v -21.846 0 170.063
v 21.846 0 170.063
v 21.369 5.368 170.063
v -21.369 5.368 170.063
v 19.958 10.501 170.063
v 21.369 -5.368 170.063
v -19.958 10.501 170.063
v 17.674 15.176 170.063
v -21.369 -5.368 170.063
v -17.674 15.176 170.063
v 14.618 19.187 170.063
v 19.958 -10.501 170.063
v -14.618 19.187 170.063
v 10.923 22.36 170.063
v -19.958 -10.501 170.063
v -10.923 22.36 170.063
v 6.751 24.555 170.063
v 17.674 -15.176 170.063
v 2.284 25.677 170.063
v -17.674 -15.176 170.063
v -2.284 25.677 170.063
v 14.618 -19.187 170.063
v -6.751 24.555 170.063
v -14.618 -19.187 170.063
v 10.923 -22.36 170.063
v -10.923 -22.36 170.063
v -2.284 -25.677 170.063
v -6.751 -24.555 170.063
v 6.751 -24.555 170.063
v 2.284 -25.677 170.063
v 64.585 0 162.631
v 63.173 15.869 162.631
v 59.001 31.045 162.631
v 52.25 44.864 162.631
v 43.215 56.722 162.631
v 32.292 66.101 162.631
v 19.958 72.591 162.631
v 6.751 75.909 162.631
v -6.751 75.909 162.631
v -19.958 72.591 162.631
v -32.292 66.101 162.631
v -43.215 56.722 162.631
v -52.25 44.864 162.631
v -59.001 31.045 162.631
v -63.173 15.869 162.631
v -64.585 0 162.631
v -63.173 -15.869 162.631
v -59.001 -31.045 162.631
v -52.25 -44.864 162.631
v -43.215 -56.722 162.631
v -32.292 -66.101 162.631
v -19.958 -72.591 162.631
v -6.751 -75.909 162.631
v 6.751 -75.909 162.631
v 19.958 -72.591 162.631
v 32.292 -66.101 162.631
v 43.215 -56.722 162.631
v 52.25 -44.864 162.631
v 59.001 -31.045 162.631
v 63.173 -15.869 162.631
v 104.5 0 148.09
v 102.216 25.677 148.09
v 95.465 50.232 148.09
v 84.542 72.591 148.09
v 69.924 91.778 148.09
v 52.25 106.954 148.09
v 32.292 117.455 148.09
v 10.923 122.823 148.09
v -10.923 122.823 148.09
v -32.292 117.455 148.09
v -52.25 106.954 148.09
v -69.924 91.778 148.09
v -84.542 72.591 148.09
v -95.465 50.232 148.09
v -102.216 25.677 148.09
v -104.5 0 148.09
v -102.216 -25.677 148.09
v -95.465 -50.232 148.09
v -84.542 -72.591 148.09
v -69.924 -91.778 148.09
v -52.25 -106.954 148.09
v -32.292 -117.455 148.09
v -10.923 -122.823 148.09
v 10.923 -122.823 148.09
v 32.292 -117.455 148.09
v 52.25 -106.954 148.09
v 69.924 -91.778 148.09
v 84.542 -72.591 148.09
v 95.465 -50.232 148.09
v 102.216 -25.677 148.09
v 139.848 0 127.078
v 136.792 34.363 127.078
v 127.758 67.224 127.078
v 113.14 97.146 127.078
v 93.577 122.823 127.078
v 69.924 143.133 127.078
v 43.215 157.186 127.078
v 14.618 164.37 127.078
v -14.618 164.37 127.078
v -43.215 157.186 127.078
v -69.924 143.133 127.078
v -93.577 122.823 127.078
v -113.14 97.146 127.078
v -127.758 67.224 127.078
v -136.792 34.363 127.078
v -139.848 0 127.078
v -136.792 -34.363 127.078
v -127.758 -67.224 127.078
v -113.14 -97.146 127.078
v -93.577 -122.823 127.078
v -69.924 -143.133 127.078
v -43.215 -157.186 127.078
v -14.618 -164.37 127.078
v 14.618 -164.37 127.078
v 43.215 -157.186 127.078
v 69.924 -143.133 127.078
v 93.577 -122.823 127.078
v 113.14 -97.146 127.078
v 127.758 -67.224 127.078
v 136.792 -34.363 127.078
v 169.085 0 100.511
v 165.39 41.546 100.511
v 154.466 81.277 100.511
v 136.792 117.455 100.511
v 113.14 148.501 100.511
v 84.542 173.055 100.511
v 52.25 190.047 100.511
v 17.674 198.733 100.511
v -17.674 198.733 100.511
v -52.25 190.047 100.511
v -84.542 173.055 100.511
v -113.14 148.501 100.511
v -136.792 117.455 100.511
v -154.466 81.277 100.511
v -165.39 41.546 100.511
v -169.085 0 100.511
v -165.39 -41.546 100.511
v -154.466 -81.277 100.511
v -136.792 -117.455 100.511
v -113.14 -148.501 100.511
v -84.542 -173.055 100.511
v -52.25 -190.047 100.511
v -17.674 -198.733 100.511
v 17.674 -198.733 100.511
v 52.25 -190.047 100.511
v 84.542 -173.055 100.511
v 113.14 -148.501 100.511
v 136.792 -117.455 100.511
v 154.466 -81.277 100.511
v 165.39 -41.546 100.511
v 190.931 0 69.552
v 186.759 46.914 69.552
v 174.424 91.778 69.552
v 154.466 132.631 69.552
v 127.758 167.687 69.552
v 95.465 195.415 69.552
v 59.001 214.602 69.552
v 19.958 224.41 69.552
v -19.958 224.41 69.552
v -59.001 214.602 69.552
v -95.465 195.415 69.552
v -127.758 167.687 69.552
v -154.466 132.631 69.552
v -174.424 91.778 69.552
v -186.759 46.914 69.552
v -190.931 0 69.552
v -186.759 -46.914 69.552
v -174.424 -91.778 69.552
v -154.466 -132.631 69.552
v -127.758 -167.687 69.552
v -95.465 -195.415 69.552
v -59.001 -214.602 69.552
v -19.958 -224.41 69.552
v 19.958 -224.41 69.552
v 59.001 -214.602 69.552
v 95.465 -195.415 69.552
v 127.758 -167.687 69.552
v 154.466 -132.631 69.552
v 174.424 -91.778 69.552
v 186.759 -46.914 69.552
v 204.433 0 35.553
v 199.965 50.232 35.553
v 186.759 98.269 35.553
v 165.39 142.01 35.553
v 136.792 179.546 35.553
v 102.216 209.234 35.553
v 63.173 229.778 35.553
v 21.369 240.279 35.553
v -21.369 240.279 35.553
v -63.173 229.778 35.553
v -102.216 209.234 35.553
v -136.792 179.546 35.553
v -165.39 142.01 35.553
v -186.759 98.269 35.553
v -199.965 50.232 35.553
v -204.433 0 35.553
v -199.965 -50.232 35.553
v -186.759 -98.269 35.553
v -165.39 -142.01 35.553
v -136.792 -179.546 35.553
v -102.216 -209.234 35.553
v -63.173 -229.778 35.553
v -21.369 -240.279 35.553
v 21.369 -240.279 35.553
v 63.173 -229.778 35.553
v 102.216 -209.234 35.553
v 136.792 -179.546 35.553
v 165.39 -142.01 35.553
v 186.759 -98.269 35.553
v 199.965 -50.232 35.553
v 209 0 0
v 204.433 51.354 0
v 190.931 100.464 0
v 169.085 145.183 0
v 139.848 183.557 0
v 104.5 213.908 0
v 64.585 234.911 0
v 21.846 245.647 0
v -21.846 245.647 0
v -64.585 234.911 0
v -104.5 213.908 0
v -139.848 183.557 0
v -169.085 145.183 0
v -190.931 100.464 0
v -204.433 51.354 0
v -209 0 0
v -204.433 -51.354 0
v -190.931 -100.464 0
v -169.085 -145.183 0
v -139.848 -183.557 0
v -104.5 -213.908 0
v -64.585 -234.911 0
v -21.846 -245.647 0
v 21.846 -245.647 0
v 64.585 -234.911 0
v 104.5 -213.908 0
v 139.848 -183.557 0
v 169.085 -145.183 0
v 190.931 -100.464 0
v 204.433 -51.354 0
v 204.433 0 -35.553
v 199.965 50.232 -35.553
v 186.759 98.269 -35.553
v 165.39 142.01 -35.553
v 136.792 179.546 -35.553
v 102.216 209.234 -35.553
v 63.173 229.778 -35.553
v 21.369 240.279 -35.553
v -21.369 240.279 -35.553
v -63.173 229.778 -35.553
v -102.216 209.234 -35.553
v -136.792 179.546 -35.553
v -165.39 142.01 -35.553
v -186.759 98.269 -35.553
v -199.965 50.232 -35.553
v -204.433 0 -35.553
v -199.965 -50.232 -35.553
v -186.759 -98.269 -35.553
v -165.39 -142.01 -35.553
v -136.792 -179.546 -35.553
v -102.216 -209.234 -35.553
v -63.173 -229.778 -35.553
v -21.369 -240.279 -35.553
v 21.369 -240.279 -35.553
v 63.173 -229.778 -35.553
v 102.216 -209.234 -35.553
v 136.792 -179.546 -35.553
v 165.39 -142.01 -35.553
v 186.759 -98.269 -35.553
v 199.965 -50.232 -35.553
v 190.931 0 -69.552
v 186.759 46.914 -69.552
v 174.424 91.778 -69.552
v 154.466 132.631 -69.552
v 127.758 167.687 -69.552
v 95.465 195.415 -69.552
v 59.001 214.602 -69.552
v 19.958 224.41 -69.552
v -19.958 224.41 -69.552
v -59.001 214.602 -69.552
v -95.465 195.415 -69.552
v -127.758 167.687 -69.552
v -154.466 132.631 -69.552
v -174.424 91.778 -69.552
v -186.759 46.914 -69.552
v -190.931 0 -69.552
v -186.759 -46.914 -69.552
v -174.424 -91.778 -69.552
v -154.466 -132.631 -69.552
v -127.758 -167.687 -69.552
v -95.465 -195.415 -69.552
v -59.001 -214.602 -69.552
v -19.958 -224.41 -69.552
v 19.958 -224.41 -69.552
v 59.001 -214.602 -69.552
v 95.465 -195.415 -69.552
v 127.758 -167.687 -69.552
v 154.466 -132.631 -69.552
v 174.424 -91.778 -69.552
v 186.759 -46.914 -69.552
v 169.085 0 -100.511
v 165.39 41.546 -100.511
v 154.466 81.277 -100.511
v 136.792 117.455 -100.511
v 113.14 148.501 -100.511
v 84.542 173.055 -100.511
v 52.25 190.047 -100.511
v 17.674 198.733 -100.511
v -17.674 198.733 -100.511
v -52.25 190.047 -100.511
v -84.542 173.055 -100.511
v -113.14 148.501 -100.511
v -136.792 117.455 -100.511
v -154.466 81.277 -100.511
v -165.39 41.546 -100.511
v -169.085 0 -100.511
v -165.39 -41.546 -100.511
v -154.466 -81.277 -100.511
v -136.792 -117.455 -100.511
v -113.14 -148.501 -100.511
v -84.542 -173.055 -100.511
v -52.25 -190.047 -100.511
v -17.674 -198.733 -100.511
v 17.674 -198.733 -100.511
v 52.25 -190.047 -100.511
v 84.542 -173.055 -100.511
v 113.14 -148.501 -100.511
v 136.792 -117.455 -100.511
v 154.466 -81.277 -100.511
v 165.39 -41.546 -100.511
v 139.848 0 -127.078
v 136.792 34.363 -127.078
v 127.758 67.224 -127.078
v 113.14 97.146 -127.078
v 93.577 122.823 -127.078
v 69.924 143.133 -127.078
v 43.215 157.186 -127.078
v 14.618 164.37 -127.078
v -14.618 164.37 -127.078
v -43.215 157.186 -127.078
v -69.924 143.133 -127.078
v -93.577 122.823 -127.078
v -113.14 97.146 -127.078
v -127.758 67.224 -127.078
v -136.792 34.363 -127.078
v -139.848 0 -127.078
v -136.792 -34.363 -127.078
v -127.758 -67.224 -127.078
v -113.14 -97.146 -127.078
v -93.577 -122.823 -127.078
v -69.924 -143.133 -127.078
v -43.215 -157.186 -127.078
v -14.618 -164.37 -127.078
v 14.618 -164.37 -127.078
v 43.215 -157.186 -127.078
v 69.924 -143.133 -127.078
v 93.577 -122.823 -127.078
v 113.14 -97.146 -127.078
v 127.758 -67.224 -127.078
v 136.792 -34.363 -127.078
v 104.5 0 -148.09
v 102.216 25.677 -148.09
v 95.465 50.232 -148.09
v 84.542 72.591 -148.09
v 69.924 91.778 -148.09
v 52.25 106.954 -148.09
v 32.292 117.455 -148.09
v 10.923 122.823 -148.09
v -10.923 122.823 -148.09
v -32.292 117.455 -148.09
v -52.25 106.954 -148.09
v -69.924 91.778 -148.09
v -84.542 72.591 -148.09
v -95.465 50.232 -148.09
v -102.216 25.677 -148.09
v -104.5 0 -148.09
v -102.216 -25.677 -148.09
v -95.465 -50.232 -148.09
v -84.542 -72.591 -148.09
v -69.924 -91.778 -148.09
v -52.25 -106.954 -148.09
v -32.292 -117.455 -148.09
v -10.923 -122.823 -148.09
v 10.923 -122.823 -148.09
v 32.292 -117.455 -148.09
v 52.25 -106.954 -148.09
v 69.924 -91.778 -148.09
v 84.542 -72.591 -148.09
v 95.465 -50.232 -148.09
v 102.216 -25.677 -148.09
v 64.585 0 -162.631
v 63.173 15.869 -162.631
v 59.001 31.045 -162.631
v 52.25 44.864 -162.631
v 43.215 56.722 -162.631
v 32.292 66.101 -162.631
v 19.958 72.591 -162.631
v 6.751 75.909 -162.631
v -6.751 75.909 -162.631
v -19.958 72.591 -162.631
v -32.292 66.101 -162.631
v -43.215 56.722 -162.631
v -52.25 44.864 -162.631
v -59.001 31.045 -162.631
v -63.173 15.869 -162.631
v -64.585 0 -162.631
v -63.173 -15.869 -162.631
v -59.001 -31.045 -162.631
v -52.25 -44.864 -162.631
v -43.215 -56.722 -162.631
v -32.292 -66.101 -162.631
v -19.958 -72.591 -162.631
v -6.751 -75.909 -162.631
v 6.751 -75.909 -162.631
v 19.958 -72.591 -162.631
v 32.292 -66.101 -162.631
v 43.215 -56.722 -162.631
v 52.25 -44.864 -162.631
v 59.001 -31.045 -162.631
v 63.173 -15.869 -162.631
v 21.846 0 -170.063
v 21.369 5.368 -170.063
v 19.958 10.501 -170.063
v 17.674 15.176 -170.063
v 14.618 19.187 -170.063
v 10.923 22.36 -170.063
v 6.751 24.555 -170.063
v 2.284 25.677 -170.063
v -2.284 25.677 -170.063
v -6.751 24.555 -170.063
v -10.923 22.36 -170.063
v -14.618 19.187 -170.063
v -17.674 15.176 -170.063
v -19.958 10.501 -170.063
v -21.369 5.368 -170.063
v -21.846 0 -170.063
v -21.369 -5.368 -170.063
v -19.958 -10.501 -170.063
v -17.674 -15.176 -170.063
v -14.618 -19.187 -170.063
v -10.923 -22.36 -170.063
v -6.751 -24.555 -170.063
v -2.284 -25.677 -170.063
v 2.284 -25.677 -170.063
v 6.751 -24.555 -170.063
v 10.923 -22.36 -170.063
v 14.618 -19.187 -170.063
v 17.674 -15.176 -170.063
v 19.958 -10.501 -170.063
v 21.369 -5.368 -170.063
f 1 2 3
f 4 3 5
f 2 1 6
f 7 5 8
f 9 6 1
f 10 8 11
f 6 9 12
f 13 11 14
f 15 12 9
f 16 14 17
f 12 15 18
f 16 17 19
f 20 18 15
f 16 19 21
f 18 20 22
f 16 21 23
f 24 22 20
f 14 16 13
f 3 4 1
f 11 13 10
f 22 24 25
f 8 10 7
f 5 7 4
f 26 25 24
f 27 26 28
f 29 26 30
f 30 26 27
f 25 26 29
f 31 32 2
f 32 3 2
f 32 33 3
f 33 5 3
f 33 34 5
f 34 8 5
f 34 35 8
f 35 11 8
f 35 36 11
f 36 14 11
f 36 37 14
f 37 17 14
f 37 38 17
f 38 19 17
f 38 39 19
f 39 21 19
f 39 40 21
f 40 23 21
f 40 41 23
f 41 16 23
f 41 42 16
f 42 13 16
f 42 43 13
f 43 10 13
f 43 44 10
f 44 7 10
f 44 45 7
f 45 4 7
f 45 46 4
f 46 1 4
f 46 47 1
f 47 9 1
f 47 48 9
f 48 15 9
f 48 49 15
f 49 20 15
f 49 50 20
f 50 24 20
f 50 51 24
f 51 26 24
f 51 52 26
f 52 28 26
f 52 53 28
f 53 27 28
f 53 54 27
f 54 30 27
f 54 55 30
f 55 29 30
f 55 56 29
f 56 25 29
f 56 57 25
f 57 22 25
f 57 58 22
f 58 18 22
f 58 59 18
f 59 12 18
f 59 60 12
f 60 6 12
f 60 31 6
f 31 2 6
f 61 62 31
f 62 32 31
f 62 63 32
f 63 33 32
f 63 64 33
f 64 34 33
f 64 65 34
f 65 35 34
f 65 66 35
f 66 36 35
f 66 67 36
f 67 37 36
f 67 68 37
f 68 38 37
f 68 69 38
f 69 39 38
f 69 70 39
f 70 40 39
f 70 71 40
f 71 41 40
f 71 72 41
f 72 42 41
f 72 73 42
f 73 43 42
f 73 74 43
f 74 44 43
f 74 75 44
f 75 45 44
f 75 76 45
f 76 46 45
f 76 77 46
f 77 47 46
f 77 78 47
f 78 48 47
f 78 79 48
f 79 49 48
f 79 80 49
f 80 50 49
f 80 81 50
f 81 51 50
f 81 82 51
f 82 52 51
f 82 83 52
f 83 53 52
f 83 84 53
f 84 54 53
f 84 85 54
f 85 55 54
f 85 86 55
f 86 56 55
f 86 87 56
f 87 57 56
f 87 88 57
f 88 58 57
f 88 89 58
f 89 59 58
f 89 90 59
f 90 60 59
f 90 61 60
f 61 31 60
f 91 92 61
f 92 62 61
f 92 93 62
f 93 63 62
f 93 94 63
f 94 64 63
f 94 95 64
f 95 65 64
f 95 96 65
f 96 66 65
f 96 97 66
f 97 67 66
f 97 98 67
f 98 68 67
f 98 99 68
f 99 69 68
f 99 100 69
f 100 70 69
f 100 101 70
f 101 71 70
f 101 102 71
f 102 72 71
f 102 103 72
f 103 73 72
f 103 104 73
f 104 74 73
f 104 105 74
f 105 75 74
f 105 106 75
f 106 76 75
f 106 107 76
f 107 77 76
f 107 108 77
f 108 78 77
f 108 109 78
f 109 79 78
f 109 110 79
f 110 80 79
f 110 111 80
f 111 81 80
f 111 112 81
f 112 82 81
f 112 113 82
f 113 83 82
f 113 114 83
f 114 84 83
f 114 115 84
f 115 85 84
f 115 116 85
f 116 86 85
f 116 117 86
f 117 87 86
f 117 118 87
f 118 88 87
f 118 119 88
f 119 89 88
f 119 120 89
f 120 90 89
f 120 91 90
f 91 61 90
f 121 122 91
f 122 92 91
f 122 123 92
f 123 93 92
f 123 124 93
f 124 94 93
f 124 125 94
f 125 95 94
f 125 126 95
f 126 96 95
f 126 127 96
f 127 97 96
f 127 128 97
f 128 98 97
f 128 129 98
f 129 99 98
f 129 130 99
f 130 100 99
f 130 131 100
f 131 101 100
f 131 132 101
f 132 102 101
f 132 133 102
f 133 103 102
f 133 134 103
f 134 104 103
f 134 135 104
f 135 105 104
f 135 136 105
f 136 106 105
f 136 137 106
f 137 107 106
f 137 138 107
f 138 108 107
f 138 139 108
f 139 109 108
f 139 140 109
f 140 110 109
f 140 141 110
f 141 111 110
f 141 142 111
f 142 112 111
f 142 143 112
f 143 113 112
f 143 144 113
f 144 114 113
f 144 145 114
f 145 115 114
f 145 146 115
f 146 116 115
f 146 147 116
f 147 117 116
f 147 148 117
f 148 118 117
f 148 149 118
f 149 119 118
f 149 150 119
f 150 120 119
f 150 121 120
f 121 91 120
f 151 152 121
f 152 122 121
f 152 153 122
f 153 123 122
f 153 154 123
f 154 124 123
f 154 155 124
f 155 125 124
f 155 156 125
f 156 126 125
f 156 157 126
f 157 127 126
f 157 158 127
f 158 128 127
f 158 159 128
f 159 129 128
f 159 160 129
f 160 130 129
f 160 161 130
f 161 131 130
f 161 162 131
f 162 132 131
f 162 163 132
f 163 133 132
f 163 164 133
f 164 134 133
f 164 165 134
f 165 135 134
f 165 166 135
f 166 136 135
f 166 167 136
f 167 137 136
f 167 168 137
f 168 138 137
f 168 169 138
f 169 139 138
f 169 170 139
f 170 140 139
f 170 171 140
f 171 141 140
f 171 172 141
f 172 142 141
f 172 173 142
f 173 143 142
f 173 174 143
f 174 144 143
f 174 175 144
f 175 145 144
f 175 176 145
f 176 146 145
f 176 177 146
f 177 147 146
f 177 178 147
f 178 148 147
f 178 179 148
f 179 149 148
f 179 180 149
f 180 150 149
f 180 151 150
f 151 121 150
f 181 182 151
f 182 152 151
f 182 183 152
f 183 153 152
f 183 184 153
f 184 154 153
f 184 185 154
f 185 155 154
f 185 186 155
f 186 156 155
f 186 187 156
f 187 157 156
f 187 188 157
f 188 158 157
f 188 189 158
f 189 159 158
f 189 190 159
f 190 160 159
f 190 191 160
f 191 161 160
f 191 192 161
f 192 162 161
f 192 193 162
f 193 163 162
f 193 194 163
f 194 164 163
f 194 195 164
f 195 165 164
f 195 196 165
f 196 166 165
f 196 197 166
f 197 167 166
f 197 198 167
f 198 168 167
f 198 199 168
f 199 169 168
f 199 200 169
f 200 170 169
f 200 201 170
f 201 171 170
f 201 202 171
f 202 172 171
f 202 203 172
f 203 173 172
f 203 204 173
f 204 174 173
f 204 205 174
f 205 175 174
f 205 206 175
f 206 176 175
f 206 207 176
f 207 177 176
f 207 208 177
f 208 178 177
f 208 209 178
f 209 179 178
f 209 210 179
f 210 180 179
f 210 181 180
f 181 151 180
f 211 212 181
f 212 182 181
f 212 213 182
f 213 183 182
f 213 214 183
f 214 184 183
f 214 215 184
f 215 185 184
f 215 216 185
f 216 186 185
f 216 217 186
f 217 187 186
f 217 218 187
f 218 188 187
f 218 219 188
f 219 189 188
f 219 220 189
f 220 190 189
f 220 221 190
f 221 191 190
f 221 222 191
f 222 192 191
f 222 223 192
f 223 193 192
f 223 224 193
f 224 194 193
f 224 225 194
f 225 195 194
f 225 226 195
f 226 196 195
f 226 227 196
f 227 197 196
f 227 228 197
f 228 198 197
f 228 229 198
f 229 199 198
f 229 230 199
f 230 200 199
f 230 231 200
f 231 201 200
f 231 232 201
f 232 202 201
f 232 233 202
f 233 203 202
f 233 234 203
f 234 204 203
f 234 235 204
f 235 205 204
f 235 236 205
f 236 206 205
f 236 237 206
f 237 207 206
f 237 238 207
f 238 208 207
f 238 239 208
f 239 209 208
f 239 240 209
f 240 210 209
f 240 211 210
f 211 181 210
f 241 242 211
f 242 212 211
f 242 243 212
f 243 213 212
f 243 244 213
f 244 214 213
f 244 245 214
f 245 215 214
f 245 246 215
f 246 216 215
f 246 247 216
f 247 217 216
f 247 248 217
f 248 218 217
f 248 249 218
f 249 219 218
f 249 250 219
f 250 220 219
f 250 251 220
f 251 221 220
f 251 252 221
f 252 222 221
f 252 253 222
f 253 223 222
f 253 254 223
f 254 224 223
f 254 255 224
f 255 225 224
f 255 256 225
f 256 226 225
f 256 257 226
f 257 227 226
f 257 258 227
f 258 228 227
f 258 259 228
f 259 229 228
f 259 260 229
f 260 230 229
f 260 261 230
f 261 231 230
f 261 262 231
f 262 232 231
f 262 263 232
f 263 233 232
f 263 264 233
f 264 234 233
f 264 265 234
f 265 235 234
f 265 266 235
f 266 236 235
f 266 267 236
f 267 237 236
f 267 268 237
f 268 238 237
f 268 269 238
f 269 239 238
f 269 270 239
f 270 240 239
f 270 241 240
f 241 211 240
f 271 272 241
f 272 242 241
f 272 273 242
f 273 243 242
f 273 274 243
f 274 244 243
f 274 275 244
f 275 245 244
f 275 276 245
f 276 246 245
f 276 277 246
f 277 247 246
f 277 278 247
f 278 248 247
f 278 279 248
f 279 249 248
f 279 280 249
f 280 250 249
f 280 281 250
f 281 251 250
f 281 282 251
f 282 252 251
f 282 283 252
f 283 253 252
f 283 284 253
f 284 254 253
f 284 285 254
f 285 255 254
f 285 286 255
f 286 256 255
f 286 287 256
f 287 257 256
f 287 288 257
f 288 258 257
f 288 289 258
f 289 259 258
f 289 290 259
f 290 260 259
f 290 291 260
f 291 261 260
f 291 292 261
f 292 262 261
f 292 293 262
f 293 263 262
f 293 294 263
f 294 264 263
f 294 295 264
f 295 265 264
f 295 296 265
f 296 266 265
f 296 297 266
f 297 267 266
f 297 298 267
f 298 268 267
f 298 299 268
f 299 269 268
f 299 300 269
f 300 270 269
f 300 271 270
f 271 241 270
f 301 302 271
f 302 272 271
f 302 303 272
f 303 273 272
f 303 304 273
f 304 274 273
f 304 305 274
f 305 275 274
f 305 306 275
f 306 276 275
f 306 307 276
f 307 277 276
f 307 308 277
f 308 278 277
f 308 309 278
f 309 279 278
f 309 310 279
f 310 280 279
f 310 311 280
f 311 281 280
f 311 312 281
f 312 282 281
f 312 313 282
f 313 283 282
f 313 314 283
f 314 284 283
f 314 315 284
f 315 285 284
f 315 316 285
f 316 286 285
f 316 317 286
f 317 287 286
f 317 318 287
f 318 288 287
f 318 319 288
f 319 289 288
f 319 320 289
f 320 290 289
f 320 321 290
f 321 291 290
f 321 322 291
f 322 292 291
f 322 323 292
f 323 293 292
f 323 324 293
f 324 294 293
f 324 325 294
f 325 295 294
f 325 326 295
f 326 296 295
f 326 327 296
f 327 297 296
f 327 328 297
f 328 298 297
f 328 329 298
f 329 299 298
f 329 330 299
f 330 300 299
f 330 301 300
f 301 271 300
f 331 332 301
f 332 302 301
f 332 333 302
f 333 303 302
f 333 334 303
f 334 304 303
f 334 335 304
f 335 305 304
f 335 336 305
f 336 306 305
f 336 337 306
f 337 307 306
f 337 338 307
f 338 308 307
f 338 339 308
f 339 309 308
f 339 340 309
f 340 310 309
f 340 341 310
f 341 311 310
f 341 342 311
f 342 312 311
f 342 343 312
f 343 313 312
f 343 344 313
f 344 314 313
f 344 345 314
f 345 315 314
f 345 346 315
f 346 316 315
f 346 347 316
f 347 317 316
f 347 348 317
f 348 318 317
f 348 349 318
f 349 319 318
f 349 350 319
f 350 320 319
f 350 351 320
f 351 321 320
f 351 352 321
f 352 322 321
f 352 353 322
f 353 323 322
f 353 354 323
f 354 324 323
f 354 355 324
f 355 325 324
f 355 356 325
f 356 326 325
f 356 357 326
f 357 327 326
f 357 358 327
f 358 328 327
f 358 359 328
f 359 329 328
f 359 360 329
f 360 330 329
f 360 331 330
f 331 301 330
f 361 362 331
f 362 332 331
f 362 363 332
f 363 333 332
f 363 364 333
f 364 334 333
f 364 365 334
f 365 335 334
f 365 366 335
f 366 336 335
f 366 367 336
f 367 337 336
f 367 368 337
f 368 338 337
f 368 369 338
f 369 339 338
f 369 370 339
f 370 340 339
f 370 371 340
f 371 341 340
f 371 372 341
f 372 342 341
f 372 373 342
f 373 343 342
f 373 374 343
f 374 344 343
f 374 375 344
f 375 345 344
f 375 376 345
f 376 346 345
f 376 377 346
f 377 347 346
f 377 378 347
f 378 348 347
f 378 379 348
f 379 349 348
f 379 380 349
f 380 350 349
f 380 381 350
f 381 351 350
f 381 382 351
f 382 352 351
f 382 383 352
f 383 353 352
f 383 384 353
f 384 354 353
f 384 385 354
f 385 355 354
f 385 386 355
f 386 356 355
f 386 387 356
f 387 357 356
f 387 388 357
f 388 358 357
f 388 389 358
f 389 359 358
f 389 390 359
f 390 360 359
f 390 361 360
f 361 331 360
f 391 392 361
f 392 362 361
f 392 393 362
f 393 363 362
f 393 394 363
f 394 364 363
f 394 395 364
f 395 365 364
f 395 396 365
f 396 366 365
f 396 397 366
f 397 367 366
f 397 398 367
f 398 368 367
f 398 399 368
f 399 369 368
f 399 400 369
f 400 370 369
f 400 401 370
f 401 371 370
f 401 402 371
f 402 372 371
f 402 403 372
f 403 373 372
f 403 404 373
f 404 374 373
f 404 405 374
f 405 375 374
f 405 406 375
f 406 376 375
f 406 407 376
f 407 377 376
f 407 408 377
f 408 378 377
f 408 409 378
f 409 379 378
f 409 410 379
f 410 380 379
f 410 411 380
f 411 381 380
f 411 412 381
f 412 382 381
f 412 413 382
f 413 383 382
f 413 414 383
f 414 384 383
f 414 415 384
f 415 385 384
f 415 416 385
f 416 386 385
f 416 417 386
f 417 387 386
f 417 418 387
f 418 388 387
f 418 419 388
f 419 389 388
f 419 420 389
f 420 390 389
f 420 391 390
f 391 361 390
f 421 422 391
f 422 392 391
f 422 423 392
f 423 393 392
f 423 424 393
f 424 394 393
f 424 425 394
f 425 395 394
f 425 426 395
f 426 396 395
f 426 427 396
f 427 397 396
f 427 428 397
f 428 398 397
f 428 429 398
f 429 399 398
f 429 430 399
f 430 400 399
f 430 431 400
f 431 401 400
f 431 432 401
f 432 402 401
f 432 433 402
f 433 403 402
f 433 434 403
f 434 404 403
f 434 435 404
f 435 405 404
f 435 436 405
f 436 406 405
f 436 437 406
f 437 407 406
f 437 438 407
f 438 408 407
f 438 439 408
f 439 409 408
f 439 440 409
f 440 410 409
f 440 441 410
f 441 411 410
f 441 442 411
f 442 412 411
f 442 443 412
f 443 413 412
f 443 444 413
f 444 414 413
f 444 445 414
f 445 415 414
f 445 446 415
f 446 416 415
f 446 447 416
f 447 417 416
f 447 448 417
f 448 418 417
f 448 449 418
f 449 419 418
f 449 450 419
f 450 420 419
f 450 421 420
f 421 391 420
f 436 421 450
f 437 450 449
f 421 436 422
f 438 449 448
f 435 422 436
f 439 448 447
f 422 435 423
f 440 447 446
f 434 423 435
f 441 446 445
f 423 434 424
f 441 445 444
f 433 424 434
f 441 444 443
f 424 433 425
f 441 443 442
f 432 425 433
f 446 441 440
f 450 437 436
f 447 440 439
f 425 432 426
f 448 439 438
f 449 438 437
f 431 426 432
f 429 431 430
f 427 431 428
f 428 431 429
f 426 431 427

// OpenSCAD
// Generated by SolidPython 1.0.1 on 2020-07-29 00:46:49


scale(v = [11, 13, 9]) {
	sphere(r = 19);
}
/***********************************************
*********      SolidPython code:      **********
************************************************
 
# import packages: SolidPython
from solid import *
from solid.utils import *
from itertools import chain, combinations, permutations


class Resize:

    def __init__(self, scad_file):
        self.scad_file = scad_file
        #self.scad_file = import_scad(scad_file)
        # cone/cylinder param:
        self.r1 = 0
        self.r2 = 0
        self.h = 0
        # rectangular prism param:
        self.w = 0
        self.l = 0
        # ellipse param:
        self.r = 0

    # import OpenScad code (file name corresponds to shape)


    # classify shape + parameters
    def assign(self, param1, param2, param3):
        if self.scad_file == 'cone.scad':
            self.r1 = param1
            self.r2 = param2
            self.h = param3
        elif self.scad_file == 'cylinder.scad':
            self.r1 = param1
            self.r2 = param2
            self.h = param3
        elif self.scad_file == 'rectangularPrism.scad':
            self.h = param1
            self.l = param2
            self.w = param3
        else:
            self.r = param1
            self.h = param2

    # resize parameters
    def iterate(self):
        x = range(3, 20, 2)
        i = 1
        if self.scad_file == 'cone.scad':
            tempList = list(permutations(x, 2))
            for temp in tempList:
                param1 = temp[0]
                param2 = temp[1]
                filepath = 'produced_scad_files/' + 'cone' + str(param1) + '_' + str(param2) + '_' + '.scad'
                scad_render_to_file(cylinder(h=param1, r1=param2, r2=0), filepath)

        elif self.scad_file == 'cylinder.scad':
            tempList = list(permutations(x, 3))
            for temp in tempList:
                param1 = temp[0]
                param2 = temp[1]
                filepath = 'produced_scad_files/' + 'cylinder' + str(param1) + '_' + str(param2) + '_' + '.scad'
                scad_render_to_file(cylinder(h=param1, r1=param2, r2=param2), filepath)

        elif self.scad_file == 'rectangularPrism.scad':
            tempList = list(permutations(x, 3))
            for temp in tempList:
                param1 = temp[0]
                param2 = temp[1]
                param3 = temp[2]
                filepath = 'produced_scad_files/' + 'rectangularPrism' + str(param1) + '_' + str(param2) + '_' + str(
                    param3) + '.scad'
                scad_render_to_file(cube(size=(param1, param2, param3)), filepath)

        elif self.scad_file == 'ellipse.scad':
            tempList = list(permutations(x, 4))
            for temp in tempList:
                param1 = temp[0]
                param2 = temp[1]
                param3 = temp[2]
                param4 = temp[3]
                filepath = 'produced_scad_files/' + 'ellipse' + str(param1) + '_' + str(param2) + '_' + str(param3) + '_' + str(param4) + '.scad'
                scad_render_to_file(scale([param1, param2, param3])(sphere(r=param4)), filepath)

    def render_to_scadfile(self):
        scad_render_to_file(scad, 'example.scad') 
 
************************************************/
